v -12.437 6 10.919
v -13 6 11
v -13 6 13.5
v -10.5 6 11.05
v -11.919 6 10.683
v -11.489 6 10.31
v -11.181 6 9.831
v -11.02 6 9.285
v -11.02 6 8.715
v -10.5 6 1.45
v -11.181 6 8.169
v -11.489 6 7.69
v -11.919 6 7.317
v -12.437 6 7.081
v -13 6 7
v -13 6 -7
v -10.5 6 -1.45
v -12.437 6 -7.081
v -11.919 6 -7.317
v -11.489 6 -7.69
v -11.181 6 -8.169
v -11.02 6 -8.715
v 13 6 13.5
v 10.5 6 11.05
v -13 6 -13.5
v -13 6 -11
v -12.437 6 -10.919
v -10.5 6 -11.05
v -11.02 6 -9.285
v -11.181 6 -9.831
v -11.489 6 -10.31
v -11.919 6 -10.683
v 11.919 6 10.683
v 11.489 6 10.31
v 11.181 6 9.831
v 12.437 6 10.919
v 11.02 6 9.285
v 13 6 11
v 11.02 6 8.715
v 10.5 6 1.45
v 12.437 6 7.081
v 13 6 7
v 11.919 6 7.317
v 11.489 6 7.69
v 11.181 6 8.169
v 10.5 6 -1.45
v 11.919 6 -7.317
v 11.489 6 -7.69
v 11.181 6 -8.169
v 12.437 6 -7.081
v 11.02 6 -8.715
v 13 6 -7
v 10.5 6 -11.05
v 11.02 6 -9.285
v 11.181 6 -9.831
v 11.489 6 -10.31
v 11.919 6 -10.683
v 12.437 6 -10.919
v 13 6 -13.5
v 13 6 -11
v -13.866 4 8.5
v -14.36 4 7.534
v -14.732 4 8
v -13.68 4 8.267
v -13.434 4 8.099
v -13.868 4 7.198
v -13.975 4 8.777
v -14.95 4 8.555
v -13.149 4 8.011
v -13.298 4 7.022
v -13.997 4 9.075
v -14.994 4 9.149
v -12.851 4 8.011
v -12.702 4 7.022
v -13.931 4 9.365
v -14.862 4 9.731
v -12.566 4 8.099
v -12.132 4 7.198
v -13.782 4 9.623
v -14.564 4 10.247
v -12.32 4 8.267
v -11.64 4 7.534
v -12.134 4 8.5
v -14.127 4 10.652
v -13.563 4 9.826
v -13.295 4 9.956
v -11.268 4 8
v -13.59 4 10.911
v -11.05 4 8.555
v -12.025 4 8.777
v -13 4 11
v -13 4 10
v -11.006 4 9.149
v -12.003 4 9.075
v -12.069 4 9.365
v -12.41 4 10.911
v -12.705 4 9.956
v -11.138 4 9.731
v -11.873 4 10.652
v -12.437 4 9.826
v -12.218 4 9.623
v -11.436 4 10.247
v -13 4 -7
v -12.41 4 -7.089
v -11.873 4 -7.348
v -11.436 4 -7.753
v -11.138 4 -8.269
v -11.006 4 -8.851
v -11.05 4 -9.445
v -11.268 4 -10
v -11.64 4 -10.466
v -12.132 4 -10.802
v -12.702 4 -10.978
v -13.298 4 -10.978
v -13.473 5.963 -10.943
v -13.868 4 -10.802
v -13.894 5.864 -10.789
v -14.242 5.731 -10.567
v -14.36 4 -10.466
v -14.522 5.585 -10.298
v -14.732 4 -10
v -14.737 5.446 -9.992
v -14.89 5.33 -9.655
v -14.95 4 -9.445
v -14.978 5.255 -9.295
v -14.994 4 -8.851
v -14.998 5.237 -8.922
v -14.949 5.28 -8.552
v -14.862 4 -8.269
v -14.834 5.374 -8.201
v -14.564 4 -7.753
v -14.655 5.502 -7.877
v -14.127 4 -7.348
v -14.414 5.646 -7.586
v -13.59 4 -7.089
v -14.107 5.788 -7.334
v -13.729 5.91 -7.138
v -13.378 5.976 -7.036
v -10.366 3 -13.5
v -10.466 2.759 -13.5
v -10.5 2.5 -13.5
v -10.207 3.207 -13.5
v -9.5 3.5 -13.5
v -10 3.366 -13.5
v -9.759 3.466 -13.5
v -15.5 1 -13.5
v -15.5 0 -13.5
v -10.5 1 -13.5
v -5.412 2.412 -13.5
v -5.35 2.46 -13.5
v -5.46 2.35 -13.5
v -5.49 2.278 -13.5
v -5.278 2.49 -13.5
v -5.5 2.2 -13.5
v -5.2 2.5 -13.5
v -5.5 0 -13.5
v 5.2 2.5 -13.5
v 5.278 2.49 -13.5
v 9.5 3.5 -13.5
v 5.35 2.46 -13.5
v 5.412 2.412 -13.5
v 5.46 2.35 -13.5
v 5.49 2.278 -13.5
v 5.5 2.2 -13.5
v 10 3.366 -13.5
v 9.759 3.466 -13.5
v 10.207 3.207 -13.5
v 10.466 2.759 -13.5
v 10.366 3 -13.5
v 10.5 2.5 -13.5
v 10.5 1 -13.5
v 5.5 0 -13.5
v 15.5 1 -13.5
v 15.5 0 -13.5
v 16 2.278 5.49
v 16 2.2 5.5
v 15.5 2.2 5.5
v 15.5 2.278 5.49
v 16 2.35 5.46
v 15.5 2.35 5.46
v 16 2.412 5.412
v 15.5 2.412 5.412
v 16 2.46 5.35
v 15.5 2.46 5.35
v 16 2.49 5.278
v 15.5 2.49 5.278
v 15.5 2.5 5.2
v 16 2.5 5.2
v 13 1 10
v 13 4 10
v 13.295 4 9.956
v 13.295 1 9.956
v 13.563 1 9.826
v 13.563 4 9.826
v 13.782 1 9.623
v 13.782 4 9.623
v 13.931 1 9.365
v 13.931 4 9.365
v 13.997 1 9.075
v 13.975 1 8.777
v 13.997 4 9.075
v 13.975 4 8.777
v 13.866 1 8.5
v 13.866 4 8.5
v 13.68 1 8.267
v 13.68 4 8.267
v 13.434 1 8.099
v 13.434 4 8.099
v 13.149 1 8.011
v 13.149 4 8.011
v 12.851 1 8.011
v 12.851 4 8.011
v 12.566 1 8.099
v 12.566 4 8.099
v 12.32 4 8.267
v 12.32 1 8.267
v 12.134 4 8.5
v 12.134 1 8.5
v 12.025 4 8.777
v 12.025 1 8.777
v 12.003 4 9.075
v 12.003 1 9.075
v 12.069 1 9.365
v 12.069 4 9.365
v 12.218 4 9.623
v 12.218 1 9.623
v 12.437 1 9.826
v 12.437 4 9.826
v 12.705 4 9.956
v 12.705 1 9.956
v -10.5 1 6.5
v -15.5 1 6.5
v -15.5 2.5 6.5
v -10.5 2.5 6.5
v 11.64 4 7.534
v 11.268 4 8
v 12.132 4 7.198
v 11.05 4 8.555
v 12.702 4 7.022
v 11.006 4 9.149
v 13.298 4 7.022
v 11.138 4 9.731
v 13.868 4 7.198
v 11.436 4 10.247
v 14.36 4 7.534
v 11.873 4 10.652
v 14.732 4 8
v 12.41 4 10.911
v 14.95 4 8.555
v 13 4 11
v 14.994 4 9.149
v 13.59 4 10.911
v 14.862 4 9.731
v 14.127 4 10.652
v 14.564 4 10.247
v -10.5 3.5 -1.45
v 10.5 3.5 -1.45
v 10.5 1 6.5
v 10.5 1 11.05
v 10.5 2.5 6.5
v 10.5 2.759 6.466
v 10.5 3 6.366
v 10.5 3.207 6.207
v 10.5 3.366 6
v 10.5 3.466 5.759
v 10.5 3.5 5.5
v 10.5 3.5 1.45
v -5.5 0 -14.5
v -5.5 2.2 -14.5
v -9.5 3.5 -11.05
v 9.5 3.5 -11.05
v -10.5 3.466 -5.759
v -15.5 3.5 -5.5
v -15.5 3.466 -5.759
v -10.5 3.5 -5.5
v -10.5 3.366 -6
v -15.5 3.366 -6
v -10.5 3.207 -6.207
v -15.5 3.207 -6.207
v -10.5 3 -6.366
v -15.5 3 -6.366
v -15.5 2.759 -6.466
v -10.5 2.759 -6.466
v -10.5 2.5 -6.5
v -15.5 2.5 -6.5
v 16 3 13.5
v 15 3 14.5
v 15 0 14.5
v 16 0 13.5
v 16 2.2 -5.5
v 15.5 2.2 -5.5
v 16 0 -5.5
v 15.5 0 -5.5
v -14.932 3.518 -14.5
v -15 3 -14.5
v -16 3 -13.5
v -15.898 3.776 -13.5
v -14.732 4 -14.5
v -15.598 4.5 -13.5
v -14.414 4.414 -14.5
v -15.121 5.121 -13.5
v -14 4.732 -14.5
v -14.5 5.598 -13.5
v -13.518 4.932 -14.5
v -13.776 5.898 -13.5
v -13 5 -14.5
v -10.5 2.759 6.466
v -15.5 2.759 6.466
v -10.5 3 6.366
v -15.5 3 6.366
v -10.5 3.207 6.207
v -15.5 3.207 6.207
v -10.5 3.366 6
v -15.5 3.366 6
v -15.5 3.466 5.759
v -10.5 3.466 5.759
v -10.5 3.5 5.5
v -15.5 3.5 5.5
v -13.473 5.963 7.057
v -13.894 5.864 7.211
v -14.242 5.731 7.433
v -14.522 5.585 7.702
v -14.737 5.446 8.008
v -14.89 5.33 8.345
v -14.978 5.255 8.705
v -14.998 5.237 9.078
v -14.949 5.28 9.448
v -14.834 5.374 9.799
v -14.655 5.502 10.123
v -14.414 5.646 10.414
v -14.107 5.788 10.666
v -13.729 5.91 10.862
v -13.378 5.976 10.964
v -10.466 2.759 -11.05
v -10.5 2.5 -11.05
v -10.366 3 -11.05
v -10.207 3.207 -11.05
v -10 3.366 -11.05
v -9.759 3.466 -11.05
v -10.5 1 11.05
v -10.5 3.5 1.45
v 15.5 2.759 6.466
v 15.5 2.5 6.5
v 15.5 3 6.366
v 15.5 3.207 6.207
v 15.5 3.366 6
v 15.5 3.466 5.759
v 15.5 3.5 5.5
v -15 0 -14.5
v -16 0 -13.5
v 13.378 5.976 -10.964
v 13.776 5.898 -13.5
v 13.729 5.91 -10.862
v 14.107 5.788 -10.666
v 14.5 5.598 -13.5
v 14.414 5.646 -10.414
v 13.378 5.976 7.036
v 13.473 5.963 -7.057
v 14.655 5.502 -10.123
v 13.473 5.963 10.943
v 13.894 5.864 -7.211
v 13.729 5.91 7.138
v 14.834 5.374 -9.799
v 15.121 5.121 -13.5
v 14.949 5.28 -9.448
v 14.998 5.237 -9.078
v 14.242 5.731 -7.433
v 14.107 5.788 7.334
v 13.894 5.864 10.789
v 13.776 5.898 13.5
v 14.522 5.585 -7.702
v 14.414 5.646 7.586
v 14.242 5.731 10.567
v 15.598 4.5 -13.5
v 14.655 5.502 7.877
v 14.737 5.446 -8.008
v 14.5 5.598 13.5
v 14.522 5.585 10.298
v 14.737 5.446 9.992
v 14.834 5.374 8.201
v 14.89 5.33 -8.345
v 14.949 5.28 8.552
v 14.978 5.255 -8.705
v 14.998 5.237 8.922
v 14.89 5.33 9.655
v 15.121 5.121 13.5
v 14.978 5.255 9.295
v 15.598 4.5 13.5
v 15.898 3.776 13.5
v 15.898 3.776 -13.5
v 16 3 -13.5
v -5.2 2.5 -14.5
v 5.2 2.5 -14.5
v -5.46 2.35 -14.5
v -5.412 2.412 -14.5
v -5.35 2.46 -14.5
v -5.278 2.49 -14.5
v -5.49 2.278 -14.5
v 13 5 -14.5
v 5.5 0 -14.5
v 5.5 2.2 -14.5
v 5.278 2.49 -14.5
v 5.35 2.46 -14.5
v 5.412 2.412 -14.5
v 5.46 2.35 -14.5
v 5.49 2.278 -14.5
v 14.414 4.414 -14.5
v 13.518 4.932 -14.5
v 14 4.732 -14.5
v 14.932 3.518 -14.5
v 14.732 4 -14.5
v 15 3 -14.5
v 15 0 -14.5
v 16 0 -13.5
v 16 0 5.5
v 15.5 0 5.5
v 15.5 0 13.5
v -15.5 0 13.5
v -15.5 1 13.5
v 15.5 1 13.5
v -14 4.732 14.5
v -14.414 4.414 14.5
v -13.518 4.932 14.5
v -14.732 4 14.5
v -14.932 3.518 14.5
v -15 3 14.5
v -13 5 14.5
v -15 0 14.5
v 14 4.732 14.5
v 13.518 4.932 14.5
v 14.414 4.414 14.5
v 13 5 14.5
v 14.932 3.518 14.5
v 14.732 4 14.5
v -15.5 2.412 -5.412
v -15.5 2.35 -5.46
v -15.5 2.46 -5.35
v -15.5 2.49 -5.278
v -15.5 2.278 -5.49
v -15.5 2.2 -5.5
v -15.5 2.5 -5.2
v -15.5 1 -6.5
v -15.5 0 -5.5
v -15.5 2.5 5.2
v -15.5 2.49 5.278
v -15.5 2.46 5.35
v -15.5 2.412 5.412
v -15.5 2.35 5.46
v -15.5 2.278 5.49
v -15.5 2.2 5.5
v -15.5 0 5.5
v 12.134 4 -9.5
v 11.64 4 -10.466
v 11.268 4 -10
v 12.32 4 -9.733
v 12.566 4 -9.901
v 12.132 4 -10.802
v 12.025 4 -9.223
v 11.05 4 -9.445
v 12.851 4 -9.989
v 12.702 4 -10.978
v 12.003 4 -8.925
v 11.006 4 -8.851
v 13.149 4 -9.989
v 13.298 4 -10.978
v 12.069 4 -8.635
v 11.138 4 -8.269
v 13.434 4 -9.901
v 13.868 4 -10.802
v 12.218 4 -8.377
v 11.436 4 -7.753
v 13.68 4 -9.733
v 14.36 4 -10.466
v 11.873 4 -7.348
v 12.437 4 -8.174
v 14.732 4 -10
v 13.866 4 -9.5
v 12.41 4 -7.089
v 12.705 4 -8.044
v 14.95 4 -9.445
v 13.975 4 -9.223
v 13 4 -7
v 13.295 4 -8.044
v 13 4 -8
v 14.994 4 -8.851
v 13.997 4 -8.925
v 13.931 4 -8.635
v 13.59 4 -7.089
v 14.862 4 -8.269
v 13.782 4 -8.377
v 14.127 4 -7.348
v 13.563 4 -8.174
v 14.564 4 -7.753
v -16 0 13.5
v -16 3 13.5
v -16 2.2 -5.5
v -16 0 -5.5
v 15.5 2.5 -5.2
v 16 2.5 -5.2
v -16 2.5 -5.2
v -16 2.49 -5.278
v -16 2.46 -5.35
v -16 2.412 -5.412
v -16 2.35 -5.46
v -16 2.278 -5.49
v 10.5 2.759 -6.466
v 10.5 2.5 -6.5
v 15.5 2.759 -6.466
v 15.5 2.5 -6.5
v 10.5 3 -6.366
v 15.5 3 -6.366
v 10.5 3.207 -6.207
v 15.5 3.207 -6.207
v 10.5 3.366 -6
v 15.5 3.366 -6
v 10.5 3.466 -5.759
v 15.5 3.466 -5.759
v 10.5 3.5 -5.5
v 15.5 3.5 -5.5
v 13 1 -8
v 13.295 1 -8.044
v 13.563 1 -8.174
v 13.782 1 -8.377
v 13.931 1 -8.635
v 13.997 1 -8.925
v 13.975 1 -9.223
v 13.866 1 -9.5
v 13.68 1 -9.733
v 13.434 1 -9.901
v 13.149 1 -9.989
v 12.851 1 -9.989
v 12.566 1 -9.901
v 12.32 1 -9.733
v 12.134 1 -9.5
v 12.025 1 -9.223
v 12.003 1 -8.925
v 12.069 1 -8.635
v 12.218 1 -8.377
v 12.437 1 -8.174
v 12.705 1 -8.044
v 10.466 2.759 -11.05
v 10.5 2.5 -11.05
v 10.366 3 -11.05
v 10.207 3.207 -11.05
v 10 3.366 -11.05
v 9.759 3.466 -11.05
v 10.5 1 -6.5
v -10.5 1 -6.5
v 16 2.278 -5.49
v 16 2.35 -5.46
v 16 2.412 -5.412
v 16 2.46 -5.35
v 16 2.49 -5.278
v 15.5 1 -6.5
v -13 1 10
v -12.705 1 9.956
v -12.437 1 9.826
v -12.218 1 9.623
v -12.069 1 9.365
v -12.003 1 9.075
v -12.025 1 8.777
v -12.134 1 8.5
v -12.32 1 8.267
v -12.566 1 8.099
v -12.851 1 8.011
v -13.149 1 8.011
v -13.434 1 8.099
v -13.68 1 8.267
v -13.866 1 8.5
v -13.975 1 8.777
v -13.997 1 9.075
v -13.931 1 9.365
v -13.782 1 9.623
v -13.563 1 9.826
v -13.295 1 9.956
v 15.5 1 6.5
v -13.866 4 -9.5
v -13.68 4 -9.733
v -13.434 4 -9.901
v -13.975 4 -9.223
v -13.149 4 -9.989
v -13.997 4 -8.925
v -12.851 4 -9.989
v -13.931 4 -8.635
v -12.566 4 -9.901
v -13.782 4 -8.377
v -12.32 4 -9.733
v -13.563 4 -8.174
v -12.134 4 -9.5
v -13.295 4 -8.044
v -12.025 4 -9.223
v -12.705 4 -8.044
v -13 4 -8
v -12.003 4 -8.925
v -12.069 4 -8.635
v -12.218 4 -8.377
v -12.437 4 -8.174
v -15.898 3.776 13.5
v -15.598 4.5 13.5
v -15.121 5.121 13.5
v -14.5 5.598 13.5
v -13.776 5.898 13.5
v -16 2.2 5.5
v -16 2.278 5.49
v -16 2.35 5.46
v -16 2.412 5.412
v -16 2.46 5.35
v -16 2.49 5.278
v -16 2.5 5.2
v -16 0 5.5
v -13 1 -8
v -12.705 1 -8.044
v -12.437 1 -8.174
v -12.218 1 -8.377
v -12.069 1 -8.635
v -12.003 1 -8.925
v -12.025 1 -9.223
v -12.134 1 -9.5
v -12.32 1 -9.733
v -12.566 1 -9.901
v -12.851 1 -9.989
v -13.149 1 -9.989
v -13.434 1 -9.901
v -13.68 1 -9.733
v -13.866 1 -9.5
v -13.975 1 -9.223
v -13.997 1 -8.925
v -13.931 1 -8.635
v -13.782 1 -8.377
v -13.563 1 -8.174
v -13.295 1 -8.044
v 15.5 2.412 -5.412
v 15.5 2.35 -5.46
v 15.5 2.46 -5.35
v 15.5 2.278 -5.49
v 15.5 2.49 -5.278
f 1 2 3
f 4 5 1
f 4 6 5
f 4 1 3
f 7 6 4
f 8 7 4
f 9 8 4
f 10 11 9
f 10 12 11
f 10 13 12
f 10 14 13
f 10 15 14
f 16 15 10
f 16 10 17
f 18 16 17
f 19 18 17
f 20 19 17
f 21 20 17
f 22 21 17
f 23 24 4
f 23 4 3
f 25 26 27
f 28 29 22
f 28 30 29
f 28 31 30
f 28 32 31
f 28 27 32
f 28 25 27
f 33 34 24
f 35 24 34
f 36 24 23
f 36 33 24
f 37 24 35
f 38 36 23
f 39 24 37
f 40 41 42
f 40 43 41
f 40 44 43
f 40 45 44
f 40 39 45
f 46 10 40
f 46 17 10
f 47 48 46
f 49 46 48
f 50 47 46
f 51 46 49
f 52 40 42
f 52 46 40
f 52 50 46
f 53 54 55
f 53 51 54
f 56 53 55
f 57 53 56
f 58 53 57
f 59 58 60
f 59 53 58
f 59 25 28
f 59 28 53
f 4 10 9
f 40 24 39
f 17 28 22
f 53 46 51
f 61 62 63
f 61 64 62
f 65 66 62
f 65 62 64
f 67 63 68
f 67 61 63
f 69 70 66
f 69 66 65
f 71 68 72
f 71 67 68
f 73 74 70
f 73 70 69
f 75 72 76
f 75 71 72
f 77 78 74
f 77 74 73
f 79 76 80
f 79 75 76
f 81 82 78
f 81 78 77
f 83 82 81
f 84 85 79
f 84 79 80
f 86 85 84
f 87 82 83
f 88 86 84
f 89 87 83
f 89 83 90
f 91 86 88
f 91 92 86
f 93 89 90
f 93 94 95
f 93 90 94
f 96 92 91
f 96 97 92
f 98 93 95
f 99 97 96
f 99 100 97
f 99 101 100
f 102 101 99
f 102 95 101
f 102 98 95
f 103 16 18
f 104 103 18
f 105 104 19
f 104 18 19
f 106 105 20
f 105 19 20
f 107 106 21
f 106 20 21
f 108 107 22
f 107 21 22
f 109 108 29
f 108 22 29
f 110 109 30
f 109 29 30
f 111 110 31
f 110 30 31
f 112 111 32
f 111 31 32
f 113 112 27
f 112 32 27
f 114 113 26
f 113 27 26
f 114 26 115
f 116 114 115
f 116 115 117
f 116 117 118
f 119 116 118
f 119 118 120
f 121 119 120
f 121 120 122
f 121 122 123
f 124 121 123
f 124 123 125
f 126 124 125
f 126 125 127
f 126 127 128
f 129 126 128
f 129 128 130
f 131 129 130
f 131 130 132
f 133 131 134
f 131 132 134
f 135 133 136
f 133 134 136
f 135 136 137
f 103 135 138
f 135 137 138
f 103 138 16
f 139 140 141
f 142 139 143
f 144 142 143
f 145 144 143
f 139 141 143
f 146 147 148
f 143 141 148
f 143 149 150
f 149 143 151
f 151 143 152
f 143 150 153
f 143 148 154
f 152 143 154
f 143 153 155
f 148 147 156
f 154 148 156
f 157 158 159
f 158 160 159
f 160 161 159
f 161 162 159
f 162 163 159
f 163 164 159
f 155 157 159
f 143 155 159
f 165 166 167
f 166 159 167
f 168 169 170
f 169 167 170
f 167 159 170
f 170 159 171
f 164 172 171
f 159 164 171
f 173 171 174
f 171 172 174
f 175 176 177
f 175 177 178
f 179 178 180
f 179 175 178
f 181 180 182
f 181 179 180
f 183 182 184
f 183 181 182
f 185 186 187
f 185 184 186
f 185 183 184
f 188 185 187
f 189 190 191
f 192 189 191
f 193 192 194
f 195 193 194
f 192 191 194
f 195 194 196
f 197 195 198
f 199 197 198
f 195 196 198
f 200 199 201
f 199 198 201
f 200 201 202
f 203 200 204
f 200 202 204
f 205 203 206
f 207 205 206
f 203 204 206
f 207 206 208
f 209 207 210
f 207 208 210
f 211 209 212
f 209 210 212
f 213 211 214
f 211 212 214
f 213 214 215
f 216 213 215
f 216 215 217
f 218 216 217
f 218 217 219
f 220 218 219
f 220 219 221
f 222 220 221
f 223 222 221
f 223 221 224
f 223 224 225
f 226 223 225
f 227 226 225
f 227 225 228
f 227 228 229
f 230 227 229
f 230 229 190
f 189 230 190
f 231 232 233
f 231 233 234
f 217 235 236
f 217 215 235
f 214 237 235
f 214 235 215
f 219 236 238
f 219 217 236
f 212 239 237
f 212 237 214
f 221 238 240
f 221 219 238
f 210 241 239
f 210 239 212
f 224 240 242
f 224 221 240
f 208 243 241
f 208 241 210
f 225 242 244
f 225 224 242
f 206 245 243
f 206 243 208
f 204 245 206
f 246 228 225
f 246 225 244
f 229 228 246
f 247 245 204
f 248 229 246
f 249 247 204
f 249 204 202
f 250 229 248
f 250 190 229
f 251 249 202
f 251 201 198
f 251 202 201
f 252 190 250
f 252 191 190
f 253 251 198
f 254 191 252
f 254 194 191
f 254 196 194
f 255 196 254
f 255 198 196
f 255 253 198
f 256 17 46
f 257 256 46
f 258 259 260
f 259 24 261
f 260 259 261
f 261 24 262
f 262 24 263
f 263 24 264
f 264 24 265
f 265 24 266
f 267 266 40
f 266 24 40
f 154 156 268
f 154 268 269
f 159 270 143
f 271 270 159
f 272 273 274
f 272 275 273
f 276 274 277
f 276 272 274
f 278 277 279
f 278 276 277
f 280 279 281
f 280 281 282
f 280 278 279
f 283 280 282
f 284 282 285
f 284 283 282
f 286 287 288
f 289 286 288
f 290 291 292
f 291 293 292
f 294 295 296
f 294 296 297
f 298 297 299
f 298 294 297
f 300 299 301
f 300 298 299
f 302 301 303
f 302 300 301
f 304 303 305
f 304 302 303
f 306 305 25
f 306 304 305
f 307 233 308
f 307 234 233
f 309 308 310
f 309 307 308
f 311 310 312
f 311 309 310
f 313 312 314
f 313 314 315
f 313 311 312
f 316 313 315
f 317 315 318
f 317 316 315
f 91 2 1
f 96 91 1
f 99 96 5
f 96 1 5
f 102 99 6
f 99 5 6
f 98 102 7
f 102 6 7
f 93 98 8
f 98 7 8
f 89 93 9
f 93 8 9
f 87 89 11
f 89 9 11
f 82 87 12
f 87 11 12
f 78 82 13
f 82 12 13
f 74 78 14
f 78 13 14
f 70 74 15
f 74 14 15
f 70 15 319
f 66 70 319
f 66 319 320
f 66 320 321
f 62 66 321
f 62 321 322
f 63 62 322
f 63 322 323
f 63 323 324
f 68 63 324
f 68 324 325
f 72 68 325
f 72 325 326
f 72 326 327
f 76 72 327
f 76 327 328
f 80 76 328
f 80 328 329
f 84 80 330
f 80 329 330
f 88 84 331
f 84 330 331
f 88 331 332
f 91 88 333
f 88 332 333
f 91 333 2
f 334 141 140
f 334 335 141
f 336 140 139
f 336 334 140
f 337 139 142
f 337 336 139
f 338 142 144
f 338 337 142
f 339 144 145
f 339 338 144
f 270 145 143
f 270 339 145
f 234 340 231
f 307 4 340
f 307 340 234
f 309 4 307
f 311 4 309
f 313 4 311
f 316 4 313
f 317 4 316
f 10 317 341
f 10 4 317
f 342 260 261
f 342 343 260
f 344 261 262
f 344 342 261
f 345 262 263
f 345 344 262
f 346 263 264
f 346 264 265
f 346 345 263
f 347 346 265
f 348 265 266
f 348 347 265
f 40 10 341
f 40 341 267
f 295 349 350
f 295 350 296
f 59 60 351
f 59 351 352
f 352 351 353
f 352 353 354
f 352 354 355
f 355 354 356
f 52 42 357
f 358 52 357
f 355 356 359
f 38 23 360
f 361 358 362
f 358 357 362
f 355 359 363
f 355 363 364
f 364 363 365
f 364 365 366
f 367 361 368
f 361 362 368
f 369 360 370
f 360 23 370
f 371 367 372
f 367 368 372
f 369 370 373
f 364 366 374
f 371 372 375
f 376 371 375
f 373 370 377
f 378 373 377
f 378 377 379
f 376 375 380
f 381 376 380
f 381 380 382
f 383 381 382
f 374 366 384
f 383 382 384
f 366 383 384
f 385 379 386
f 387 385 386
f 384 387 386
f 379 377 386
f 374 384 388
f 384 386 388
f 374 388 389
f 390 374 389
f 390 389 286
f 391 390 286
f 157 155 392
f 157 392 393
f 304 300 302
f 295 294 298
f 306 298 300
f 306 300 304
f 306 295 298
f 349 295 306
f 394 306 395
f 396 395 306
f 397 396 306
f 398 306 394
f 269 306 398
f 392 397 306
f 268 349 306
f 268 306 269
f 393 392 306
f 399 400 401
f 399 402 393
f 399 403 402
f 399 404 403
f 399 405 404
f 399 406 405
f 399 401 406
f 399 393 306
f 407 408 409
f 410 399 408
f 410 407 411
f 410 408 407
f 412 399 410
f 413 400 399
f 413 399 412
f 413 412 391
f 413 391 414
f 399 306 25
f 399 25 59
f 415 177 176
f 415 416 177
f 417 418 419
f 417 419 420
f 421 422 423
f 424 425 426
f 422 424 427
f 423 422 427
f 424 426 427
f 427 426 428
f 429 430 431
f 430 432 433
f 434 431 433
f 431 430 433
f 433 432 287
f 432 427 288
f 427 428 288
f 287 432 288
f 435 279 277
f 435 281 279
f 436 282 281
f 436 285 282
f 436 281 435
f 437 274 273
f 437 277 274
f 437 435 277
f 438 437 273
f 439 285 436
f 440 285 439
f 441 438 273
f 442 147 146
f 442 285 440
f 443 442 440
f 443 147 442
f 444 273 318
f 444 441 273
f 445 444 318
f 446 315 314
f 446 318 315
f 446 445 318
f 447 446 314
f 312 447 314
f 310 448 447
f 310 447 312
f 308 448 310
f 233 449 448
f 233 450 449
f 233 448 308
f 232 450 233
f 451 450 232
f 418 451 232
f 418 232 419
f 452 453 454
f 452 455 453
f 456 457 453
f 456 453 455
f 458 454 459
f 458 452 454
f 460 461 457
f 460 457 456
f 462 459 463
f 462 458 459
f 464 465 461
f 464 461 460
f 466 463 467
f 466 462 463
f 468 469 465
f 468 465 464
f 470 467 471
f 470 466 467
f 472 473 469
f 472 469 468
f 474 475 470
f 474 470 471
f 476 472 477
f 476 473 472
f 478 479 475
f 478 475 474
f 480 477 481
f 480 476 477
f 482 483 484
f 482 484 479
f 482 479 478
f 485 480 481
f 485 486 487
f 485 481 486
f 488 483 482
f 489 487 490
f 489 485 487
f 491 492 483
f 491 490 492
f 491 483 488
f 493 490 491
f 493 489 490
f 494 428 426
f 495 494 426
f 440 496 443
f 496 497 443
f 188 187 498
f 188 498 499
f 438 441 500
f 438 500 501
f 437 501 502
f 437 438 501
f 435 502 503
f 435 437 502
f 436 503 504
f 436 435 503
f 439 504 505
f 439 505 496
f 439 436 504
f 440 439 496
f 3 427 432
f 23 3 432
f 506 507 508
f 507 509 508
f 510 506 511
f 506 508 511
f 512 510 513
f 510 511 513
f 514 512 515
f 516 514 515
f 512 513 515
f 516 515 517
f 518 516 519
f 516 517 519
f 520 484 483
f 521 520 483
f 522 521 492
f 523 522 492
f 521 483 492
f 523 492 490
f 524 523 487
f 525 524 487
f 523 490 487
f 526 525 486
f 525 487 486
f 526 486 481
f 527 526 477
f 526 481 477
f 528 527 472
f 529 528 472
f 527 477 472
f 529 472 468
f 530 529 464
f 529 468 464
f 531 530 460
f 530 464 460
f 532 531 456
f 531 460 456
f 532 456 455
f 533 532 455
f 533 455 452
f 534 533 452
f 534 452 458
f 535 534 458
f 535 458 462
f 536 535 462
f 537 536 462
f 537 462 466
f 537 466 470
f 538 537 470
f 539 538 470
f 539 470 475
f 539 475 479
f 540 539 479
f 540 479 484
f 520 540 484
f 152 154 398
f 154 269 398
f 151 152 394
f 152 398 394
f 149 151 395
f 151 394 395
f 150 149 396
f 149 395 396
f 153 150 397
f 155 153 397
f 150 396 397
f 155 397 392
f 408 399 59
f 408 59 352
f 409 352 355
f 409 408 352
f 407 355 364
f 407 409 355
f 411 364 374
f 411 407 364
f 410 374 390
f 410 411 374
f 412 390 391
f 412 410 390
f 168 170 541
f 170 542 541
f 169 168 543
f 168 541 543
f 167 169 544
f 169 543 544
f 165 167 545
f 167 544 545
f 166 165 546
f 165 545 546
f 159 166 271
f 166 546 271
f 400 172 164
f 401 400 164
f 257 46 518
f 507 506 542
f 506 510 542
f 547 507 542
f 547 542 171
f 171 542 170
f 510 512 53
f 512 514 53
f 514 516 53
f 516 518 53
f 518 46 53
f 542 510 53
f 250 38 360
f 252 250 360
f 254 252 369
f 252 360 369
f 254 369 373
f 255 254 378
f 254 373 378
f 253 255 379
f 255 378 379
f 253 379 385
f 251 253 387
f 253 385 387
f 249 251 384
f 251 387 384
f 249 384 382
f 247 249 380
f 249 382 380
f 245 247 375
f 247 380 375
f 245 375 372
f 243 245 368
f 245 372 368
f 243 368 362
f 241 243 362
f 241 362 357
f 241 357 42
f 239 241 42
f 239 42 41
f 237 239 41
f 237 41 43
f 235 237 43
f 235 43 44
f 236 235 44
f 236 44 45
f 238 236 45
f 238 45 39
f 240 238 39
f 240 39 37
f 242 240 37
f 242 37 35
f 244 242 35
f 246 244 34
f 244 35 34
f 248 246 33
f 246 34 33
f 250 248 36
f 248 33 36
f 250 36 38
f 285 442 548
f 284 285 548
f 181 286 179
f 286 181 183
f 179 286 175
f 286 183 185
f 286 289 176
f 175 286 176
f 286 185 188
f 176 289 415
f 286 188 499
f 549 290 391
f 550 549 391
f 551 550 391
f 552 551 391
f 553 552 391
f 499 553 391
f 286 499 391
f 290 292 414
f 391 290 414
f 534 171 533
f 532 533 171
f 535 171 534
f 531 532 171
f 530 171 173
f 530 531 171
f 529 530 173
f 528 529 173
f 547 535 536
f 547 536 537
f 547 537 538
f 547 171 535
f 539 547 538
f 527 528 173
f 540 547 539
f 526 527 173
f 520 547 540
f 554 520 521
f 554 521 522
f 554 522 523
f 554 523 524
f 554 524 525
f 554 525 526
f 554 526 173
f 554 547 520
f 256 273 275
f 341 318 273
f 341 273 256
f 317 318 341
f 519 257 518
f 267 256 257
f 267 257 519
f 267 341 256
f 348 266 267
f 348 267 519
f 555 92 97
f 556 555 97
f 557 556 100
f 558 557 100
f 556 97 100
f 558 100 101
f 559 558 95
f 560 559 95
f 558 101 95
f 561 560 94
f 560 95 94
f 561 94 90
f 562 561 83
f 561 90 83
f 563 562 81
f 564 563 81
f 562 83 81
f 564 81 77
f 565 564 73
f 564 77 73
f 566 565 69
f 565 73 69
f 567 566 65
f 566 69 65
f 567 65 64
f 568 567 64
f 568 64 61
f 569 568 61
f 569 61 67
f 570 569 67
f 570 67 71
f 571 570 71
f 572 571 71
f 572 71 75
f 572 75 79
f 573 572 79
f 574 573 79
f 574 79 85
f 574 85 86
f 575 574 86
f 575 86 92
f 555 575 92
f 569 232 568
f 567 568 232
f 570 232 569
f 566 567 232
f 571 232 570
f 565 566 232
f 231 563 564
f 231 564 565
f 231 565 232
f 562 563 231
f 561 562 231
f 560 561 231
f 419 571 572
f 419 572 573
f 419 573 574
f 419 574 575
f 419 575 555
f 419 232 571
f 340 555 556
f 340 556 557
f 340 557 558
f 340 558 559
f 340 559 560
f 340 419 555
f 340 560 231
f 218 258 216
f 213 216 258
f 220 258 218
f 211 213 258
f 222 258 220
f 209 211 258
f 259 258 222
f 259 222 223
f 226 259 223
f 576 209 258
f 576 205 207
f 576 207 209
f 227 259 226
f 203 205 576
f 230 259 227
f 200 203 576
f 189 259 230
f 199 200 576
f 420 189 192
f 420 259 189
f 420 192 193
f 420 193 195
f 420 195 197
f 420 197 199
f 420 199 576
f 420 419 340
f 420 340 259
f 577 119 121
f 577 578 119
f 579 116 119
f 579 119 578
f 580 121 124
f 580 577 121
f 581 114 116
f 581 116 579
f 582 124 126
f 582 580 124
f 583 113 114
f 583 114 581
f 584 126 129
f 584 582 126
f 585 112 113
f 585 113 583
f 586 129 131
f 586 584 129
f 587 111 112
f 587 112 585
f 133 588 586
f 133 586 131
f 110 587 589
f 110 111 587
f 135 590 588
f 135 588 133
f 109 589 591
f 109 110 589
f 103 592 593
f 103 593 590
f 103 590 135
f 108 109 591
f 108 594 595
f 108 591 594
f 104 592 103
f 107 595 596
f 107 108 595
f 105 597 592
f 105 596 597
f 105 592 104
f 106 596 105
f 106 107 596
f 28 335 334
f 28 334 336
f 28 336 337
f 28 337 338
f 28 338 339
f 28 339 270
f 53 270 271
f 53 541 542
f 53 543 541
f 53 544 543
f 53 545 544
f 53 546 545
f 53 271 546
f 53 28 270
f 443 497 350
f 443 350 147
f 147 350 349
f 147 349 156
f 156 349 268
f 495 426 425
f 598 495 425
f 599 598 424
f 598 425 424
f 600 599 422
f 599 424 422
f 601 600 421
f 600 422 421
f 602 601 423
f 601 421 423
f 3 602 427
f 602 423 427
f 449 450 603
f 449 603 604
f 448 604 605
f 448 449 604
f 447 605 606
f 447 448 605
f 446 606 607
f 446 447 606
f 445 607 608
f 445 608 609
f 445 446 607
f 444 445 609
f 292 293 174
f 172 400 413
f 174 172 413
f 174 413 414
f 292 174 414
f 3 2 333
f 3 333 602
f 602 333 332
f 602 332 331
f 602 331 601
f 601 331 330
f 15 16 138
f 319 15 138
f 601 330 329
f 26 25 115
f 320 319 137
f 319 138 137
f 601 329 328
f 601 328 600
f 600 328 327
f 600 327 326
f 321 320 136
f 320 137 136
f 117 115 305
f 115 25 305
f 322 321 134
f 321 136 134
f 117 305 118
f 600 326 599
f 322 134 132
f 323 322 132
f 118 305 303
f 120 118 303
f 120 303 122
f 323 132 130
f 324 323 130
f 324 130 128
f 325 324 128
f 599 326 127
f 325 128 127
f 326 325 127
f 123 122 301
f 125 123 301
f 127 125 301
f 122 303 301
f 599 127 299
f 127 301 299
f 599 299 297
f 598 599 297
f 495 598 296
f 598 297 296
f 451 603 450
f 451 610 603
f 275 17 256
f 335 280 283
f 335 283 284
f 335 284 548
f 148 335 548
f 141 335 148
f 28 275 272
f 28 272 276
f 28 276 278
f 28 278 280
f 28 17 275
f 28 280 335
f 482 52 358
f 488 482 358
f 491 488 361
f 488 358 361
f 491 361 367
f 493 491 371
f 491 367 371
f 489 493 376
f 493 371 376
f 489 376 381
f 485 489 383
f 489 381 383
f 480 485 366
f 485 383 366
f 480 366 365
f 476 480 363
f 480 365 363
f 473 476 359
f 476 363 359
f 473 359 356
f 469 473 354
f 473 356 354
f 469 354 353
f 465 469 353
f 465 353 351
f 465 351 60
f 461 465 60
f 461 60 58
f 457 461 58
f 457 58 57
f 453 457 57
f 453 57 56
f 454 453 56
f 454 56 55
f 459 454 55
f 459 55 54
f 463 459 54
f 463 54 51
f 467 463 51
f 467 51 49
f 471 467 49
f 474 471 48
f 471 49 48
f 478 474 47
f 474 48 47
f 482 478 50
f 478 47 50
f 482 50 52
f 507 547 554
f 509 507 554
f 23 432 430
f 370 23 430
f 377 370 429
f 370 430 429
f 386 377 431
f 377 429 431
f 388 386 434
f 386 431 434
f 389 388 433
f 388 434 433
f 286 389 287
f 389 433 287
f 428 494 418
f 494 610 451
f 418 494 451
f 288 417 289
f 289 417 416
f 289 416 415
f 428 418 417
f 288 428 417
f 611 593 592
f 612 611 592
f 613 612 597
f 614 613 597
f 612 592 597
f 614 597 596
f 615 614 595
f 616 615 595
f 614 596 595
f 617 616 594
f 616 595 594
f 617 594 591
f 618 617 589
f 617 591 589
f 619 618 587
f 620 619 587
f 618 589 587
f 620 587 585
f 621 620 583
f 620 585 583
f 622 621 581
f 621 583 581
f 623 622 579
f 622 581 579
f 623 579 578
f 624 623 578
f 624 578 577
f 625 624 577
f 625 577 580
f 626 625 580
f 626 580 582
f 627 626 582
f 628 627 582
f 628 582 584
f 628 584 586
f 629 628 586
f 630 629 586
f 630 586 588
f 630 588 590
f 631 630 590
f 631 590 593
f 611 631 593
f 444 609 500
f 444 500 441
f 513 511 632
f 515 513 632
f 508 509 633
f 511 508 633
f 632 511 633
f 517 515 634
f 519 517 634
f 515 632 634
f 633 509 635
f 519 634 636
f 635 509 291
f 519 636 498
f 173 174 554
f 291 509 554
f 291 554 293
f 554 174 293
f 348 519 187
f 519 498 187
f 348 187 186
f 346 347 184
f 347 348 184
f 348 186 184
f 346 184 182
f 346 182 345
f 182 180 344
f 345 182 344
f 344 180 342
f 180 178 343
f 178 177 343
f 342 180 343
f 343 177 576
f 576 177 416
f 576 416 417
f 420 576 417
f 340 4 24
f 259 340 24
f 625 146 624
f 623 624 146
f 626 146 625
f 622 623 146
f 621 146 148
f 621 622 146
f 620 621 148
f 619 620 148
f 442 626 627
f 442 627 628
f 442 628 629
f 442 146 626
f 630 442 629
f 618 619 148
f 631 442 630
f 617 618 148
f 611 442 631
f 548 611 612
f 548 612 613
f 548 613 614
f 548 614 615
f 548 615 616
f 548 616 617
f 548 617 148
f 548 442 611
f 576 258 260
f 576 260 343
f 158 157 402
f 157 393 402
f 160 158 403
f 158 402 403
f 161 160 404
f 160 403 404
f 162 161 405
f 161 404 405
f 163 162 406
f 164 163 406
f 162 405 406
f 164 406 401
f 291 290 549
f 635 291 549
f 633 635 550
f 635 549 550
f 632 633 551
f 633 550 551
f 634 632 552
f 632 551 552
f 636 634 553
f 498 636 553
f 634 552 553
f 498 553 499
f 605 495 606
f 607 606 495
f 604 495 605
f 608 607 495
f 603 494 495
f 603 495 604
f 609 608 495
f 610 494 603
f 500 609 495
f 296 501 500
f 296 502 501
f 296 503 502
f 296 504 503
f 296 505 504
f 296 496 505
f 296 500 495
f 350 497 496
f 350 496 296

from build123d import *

# Parameters (mm, degrees)
SKETCH1_W           = 32
SKETCH1_H           = 29
BOSS_EXTRUDE1_DEPTH = 6
SKETCH2_R           = 1
CUT_EXTRUDE1_DEPTH  = 10
SKETCH3_W           = 21
SKETCH3_H           = 9.6
CUT_EXTRUDE2_DEPTH  = 10
SKETCH4_W           = 31
SKETCH4_H           = 27
CUT_EXTRUDE3_DEPTH  = 1
FILLET2_R           = 3
SKETCH5_R           = 2
CUT_EXTRUDE4_DEPTH  = 2
CHAMFER2_SIZE       = 1
SKETCH6_W           = 1
SKETCH6_H           = 11
CUT_EXTRUDE5_DEPTH  = 2.5
FILLET3_R           = 0.3
SKETCH7_W           = 31
SKETCH7_H           = 13
CUT_EXTRUDE6_DEPTH  = 2.5
FILLET4_R           = 1
SKETCH_1_W          = 21
SKETCH_1_H          = 12.05
CUT_EXTRUDE_1_DEPTH = 2.5
FILLET_1_R          = 1
SKETCH_2_W          = 11
SKETCH_2_H          = 2.5
CUT_EXTRUDE_2_DEPTH = 33.802439001
FILLET_2_R          = 0.3


with BuildPart() as part:
    # Sketch1 → Boss-Extrude1 (new body)
    with BuildSketch(Plane(origin=(0, 0, 0), x_dir=(1, 0, 0), z_dir=(0, 1, 0))):
        Rectangle(SKETCH1_W, SKETCH1_H)
    extrude(amount=BOSS_EXTRUDE1_DEPTH)

    # Sketch2 → Cut-Extrude1 (cut)
    with BuildSketch(Plane(origin=(0, 6, 0), x_dir=(1, 0, 0), z_dir=(0, 1, 0))):
        with Locations(Location((-13, 9, 0), (0, 0, 270))):
            Circle(SKETCH2_R)
        with Locations(Location((13, 9, 0), (0, 0, 270))):
            Circle(SKETCH2_R)
        with Locations(Location((13, -9, 0), (0, 0, 270))):
            Circle(SKETCH2_R)
        with Locations(Location((-13, -9, 0), (0, 0, 270))):
            Circle(SKETCH2_R)
    extrude(amount=-CUT_EXTRUDE1_DEPTH, mode=Mode.SUBTRACT)

    # Sketch3 → Cut-Extrude2 (cut)
    with BuildSketch(Plane(origin=(0, 6, 0), x_dir=(1, 0, 0), z_dir=(0, 1, 0))):
        with Locations((0, 6.25)):
            Rectangle(SKETCH3_W, SKETCH3_H)
        with Locations((0, -6.25)):
            Rectangle(SKETCH3_W, SKETCH3_H)
    extrude(amount=-CUT_EXTRUDE2_DEPTH, mode=Mode.SUBTRACT)

    # Sketch4 → Cut-Extrude3 (cut)
    with BuildSketch(Plane.XZ):
        Rectangle(SKETCH4_W, SKETCH4_H)
    extrude(amount=-CUT_EXTRUDE3_DEPTH, mode=Mode.SUBTRACT)

    # Fillet2
    # the kernel refuses this fillet: 3 mm, written as the material it takes off along each edge
    with BuildSketch(Plane(origin=(16, 6, 22), x_dir=(0, -1, 0), z_dir=(0, 0, -1)), Plane(origin=(-16, 6, -22), x_dir=(0, -1, 0), z_dir=(0, 0, 1))) as fillet2_piece_1:
        with BuildLine():
            CenterArc((FILLET2_R, FILLET2_R), FILLET2_R, 180, 90)
            Line((0, FILLET2_R), (0, 0))
            Line((0, 0), (FILLET2_R, 0))
        make_face()
    extrude(amount=44, mode=Mode.SUBTRACT)

    # Sketch5 → Cut-Extrude4 (cut)
    with BuildSketch(Plane(origin=(0, 6, 0), x_dir=(1, 0, 0), z_dir=(0, 1, 0))):
        with Locations(Location((-13, 9, 0), (0, 0, 270))):
            Circle(SKETCH5_R)
        with Locations(Location((13, 9, 0), (0, 0, 270))):
            Circle(SKETCH5_R)
        with Locations(Location((13, -9, 0), (0, 0, 270))):
            Circle(SKETCH5_R)
        with Locations(Location((-13, -9, 0), (0, 0, 270))):
            Circle(SKETCH5_R)
    extrude(amount=-CUT_EXTRUDE4_DEPTH, mode=Mode.SUBTRACT)

    # Chamfer2
    chamfer2_edges = [part.edges().sort_by_distance(p)[0] for p in [
        (-16, 1.5, 14.5),
        (-16, 1.5, -14.5),
        (0, 6, -14.5),
        (16, 1.5, -14.5),
        (15.121320344, 5.121320344, -14.5),
        (-15.121320344, 5.121320344, -14.5),
        (0, 6, 14.5),
        (16, 1.5, 14.5),
        (15.121320344, 5.121320344, 14.5),
        (-15.121320344, 5.121320344, 14.5),
    ]]
    chamfer(chamfer2_edges, length=CHAMFER2_SIZE)

    # Sketch6 → Cut-Extrude5 (cut)
    with BuildSketch(Plane.XZ):
        with Locations((-15.5, 0)):
            Rectangle(SKETCH6_W, SKETCH6_H)
        with Locations((15.5, 0)):
            Rectangle(SKETCH6_W, SKETCH6_H)
    extrude(amount=-CUT_EXTRUDE5_DEPTH, mode=Mode.SUBTRACT)

    # Fillet3
    fillet3_edges = [part.edges().sort_by_distance(p)[0] for p in [
        (-15.5, 2.5, 5.5),
        (-15.5, 2.5, -5.5),
        (15.5, 2.5, -5.5),
        (15.5, 2.5, 5.5),
    ]]
    fillet(fillet3_edges, radius=FILLET3_R)

    # Sketch7 → Cut-Extrude6 (cut)
    with BuildSketch(Plane.XZ.offset(-1)):
        Rectangle(SKETCH7_W, SKETCH7_H)
    extrude(amount=-CUT_EXTRUDE6_DEPTH, mode=Mode.SUBTRACT)

    # Fillet4
    fillet4_edges = [part.edges().sort_by_distance(p)[0] for p in [
        (-13, 3.5, 6.5),
        (13, 3.5, 6.5),
        (-13, 3.5, -6.5),
        (13, 3.5, -6.5),
    ]]
    fillet(fillet4_edges, radius=FILLET4_R)

    # Эскиз1 → Вырез-Вытянуть1 (cut)
    with BuildSketch(Plane.XZ.offset(-1)):
        with Locations((0, -7.475)):
            Rectangle(SKETCH_1_W, SKETCH_1_H)
    extrude(amount=-CUT_EXTRUDE_1_DEPTH, mode=Mode.SUBTRACT)

    # Скругление1
    fillet_1_edges = [part.edges().sort_by_distance(p)[0] for p in [
        (10.5, 3.5, -12.275),
        (-10.5, 3.5, -12.275),
    ]]
    fillet(fillet_1_edges, radius=FILLET_1_R)

    # Эскиз2 → Вырез-Вытянуть2 (cut, through all)
    with BuildSketch(Plane.XY.offset(-13.5)):
        with Locations((0, 1.25)):
            Rectangle(SKETCH_2_W, SKETCH_2_H)
    extrude(amount=-CUT_EXTRUDE_2_DEPTH, mode=Mode.SUBTRACT)

    # Скругление2
    fillet_2_edges = [part.edges().sort_by_distance(p)[0] for p in [
        (5.5, 2.5, -14),
        (-5.5, 2.5, -14),
    ]]
    fillet(fillet_2_edges, radius=FILLET_2_R)


solid = part.part
